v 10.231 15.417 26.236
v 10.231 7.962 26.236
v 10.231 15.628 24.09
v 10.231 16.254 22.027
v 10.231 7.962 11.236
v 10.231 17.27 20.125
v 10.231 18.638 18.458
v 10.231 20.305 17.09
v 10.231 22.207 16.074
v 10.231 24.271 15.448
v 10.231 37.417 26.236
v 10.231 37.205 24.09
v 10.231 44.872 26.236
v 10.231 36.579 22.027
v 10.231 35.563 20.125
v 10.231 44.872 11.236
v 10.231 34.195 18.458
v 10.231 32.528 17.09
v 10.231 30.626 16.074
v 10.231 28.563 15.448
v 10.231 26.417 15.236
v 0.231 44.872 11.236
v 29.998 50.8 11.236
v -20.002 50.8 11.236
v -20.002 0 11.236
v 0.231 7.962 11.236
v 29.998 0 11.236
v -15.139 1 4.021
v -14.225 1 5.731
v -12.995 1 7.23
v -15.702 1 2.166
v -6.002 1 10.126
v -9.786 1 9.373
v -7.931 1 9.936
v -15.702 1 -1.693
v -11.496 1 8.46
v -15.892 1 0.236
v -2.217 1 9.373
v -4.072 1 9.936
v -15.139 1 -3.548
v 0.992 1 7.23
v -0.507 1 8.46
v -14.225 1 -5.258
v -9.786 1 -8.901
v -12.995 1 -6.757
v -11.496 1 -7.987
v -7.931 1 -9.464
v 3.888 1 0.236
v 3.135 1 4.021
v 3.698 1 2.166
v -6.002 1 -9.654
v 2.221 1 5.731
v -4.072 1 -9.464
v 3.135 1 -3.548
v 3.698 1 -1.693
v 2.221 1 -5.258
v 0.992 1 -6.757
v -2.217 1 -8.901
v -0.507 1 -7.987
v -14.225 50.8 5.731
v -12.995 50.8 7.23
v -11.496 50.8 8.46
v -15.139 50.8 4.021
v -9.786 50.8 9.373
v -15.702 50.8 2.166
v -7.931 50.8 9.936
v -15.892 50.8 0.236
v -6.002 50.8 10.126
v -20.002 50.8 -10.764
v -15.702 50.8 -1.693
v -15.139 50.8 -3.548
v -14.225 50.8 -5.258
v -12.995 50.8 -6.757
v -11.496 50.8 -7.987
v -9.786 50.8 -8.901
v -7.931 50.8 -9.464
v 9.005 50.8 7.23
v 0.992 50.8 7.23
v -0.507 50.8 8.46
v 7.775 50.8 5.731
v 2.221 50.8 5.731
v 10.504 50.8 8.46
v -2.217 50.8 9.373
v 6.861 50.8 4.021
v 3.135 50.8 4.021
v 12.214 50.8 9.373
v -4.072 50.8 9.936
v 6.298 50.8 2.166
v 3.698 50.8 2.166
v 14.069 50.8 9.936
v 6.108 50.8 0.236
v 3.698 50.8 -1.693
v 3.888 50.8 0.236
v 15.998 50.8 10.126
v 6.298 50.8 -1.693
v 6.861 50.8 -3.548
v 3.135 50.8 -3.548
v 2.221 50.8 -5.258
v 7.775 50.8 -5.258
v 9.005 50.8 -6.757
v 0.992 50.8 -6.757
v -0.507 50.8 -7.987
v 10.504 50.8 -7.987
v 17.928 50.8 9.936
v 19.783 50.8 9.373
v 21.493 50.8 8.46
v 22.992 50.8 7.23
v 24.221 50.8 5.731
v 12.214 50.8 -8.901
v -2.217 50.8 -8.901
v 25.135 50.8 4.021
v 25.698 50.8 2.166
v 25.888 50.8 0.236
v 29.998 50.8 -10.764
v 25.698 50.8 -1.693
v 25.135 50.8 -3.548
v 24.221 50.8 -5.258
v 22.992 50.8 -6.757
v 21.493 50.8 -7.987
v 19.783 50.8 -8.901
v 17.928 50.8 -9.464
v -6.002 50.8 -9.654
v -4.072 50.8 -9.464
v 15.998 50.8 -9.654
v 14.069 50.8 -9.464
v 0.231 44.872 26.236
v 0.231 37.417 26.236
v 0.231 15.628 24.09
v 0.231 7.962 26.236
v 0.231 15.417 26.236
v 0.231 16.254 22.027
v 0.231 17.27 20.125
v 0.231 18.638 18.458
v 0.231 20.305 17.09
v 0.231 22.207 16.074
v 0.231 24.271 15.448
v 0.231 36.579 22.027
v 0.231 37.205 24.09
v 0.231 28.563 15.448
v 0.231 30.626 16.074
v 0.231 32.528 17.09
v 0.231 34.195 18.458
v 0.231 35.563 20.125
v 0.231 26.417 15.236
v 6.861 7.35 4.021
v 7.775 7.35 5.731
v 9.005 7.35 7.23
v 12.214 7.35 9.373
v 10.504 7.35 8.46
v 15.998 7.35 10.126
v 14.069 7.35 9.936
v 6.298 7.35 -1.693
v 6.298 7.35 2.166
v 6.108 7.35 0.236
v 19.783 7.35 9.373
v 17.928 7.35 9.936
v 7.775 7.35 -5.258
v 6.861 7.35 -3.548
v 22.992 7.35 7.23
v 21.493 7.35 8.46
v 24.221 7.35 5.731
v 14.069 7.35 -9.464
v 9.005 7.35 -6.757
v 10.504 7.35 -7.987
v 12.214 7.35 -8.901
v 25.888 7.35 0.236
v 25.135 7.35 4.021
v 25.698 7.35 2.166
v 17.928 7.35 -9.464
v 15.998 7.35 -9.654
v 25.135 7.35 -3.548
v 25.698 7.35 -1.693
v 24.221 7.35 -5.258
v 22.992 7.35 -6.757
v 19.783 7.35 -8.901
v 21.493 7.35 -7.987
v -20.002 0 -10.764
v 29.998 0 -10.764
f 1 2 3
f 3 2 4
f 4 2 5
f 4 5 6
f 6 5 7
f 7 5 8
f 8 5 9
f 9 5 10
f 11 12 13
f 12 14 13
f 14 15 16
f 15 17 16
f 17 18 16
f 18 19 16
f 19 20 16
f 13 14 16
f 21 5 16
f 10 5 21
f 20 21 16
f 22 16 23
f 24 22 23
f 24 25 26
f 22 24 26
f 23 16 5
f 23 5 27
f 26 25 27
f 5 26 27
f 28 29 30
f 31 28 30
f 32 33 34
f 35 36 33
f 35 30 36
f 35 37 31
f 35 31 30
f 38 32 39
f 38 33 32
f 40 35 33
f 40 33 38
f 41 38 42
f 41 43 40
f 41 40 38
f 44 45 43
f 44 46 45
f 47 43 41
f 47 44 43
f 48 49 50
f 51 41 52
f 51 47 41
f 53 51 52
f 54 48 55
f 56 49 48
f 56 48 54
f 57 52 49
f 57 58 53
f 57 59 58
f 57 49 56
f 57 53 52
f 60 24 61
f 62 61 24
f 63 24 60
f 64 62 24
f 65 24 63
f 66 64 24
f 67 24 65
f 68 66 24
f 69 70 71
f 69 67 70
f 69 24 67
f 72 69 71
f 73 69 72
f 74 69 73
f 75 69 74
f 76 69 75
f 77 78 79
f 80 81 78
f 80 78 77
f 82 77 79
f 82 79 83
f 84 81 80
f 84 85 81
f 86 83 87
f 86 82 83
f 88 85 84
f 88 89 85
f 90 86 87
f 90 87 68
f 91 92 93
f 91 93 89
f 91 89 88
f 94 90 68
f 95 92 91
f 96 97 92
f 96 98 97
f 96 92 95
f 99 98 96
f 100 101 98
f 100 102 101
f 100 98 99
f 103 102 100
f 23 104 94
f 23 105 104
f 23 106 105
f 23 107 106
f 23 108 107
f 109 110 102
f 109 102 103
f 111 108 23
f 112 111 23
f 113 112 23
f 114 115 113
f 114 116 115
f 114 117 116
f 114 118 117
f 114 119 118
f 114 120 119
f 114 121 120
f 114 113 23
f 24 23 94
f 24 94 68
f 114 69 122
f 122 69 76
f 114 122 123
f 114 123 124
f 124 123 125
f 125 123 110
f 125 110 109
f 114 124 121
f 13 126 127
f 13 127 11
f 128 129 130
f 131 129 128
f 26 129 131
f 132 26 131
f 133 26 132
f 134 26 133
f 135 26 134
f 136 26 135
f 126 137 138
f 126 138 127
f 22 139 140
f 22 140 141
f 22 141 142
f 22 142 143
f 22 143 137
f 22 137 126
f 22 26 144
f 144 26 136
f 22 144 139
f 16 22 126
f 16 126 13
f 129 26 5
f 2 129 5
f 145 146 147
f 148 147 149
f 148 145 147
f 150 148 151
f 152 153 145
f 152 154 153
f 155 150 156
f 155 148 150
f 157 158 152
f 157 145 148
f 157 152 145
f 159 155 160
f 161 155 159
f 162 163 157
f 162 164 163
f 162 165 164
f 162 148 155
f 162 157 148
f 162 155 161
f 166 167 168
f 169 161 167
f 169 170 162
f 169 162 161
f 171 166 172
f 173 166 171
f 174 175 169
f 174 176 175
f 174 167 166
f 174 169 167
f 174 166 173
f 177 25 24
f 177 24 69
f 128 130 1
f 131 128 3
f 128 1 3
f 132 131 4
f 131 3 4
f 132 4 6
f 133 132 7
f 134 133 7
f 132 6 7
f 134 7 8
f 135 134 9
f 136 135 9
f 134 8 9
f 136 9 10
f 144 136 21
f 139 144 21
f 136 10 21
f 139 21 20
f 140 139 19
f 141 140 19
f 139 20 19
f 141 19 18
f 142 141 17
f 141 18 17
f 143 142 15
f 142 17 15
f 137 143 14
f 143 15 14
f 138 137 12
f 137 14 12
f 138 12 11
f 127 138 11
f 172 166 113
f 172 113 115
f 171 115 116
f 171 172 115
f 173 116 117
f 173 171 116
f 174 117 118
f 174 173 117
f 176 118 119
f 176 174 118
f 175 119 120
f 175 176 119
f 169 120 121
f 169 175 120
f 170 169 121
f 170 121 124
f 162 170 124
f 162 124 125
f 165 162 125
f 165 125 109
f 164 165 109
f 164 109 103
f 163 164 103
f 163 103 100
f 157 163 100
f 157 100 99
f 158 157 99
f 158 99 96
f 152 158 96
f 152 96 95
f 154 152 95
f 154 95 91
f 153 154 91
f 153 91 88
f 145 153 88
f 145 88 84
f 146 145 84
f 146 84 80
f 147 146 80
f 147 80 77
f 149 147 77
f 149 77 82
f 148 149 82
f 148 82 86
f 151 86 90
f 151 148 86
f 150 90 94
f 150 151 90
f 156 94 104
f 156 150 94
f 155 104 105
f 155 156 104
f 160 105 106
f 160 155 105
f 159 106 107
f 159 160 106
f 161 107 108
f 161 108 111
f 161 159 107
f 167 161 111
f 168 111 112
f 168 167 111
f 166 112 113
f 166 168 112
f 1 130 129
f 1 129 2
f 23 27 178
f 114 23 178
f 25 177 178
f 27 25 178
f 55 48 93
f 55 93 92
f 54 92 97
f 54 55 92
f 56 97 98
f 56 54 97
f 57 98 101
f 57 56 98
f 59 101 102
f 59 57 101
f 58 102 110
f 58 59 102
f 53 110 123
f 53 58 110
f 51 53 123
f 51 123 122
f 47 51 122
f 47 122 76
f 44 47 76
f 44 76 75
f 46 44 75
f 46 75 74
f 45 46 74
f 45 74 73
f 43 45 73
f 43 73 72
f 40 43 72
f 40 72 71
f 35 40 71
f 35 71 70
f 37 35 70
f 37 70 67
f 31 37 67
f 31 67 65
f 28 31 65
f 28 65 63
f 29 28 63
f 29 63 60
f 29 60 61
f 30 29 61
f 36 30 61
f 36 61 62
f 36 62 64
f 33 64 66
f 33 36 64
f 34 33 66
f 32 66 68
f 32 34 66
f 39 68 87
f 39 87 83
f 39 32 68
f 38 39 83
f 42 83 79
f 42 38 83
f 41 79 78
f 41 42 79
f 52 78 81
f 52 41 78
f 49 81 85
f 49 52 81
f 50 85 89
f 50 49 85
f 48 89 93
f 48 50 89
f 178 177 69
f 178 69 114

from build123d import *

# Parameters (mm, degrees)
SKETCH1_W           = 50
SKETCH1_H           = 22
SKETCH1_R           = 9.89
BOSS_EXTRUDE1_DEPTH = 50.8
SKETCH2_R           = 10.5
BOSS_EXTRUDE2_DEPTH = 1
SKETCH3_R           = 10.5
BOSS_EXTRUDE3_DEPTH = 6.35
SKETCH5_W           = 10
SKETCH5_H           = 36.91
BOSS_EXTRUDE4_DEPTH = 15
SKETCH7_R           = 11
CUT_EXTRUDE1_DEPTH  = 10


with BuildPart() as part:
    # Sketch1 → Boss-Extrude1 (new body)
    with BuildSketch(Plane(origin=(0, 0, 0), x_dir=(1, 0, 0), z_dir=(0, 1, 0))):
        with Locations((4.998255194, -0.2362853)):
            Rectangle(SKETCH1_W, SKETCH1_H)
        with Locations((-6.001744806, -0.2362853)):
            Circle(SKETCH1_R, mode=Mode.SUBTRACT)
        with Locations((15.998255194, -0.2362853)):
            Circle(SKETCH1_R, mode=Mode.SUBTRACT)
    extrude(amount=BOSS_EXTRUDE1_DEPTH)

    # Sketch2 → Boss-Extrude2 (add)
    with BuildSketch(Plane(origin=(0, 0, 0), x_dir=(1, 0, 0), z_dir=(0, 1, 0))):
        with Locations((15.998255194, -0.2362853)):
            Circle(SKETCH2_R)
        with Locations((-6.001744806, -0.2362853)):
            Circle(SKETCH2_R)
    extrude(amount=BOSS_EXTRUDE2_DEPTH)

    # Sketch3 → Boss-Extrude3 (add)
    with BuildSketch(Plane(origin=(0, 1, 0), x_dir=(1, 0, 0), z_dir=(0, 1, 0))):
        with Locations((15.703735374, 0)):
            Circle(SKETCH3_R)
    extrude(amount=BOSS_EXTRUDE3_DEPTH)

    # Sketch5 → Boss-Extrude4 (add)
    with BuildSketch(Plane.XY.offset(11.2362853)):
        with Locations((5.231381217, 26.416579834)):
            Rectangle(SKETCH5_W, SKETCH5_H)
    extrude(amount=BOSS_EXTRUDE4_DEPTH)

    # Sketch7 → Cut-Extrude1 (cut)
    with BuildSketch(Plane(origin=(10.231381217, 0, 0), x_dir=(0, 0, -1), z_dir=(1, 0, 0))):
        with Locations((-26.2362853, 26.416579834)):
            Circle(SKETCH7_R)
    extrude(amount=-CUT_EXTRUDE1_DEPTH, mode=Mode.SUBTRACT)


solid = part.part
